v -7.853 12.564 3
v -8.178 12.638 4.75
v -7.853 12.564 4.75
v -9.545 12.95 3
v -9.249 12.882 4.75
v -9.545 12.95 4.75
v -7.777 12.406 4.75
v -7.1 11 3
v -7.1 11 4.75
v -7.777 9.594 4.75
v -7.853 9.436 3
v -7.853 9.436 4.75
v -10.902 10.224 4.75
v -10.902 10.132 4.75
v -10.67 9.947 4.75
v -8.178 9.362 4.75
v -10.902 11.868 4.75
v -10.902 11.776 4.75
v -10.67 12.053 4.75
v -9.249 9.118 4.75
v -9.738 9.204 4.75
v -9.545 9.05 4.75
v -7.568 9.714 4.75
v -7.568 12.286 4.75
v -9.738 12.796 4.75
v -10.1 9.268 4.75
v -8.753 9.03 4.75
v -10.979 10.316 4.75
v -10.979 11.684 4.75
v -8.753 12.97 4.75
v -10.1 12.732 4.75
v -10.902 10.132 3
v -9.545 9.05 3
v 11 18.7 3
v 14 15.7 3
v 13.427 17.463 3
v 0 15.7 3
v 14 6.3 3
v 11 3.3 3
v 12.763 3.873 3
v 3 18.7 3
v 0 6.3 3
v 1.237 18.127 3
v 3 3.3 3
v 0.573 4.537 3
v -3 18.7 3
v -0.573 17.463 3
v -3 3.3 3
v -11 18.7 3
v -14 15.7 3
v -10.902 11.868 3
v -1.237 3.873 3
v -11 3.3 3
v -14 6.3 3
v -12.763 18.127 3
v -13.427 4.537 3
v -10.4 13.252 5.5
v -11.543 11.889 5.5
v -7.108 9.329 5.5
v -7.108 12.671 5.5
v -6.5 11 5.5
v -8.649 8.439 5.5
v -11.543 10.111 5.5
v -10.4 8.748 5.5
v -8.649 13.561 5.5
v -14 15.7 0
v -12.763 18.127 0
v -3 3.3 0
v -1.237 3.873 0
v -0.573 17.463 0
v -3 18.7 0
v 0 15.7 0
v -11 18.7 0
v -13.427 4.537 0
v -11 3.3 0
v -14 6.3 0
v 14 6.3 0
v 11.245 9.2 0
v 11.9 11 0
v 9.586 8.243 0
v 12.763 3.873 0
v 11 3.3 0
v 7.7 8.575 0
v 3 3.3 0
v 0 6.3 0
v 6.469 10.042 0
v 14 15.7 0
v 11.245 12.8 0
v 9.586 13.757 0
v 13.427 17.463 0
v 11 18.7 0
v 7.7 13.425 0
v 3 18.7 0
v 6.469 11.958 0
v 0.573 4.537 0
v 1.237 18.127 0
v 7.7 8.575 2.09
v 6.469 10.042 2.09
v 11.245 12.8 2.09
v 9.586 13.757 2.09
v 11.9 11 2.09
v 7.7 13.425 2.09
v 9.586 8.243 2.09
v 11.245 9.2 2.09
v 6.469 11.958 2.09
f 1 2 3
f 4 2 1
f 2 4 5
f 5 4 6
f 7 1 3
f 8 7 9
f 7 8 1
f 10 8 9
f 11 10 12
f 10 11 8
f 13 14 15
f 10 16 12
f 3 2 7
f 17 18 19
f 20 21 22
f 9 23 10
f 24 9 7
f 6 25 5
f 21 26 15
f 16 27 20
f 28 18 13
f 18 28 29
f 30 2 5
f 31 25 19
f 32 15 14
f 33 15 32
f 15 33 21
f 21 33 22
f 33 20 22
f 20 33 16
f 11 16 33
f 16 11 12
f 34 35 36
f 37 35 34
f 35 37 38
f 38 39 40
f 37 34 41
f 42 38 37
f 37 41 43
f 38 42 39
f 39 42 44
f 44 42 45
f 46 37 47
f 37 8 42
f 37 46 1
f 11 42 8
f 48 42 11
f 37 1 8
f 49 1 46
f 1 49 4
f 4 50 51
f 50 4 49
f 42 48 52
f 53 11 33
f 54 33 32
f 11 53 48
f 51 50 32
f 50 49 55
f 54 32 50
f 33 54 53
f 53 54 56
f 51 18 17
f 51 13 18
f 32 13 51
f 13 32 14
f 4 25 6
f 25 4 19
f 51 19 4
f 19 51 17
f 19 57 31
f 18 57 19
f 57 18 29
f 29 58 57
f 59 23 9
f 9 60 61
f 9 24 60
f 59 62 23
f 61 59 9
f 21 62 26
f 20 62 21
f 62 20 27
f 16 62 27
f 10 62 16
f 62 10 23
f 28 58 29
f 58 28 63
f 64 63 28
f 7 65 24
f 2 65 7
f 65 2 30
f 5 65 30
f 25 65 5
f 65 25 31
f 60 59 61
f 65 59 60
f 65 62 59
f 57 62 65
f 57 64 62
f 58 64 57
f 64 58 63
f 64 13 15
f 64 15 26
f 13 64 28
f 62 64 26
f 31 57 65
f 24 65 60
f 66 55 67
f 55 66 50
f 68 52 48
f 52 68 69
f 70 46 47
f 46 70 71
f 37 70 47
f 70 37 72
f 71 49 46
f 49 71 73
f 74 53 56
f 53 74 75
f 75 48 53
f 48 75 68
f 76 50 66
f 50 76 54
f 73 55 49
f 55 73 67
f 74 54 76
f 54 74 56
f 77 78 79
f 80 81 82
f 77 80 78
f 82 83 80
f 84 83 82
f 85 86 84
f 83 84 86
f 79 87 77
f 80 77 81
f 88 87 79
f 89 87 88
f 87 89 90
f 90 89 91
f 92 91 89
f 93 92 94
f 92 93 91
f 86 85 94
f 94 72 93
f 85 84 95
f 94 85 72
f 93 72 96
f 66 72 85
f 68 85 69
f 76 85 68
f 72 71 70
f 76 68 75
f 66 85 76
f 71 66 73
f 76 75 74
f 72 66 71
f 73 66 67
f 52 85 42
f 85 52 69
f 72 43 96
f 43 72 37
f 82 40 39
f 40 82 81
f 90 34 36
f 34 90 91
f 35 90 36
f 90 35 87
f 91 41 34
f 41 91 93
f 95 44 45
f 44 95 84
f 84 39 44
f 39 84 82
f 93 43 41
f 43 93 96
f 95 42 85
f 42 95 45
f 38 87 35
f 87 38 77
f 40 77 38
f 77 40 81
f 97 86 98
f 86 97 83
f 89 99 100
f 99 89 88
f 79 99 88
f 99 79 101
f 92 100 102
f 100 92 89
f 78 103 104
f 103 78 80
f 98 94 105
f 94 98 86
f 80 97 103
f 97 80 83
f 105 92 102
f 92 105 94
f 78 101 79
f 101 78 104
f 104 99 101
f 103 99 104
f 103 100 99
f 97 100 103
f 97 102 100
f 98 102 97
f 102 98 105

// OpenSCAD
// latches/snap.scad — printed peg-and-socket snap closure.
// MIT licensed.
//
// Convention: end="left" extends in -X from origin; end="right" extends in +X.
// Caller places at x=0 for left and translates to band_length for right.
//
// Both ends have a flat tab extending past the band edge. The LEFT tab has
// a small peg pointing up; the RIGHT tab has a matching socket on its
// underside. When worn, the right tab lays on top of the left tab and the
// peg snaps into the socket.

SNAP_TAB_LENGTH    = 14;   // mm — how far the tab extends past the band
SNAP_PEG_DIAMETER  = 4;    // mm
SNAP_PEG_HEIGHT    = 2.5;  // mm — pegs head sticks above the tab top
SNAP_PEG_HEAD_R    = 2.6;  // mm — flared head, slightly wider than the shaft

module _snap_tab(band_width, band_thickness, direction) {
    // direction = -1 for left (extends -X) or +1 for right (extends +X)
    tab_w = band_width * 0.7;
    x0 = direction == -1 ? -SNAP_TAB_LENGTH : 0;
    translate([x0, (band_width - tab_w) / 2, 0])
        linear_extrude(height = band_thickness)
            offset(r = 3) offset(delta = -3)
                square([SNAP_TAB_LENGTH, tab_w]);
}

module latch_snap(band_width, band_thickness, end = "both") {
    if (end == "left" || end == "both") {
        // tab extends -X
        _snap_tab(band_width, band_thickness, direction = -1);
        // peg pointing up at the tab's tip
        translate([-SNAP_TAB_LENGTH * 0.65, band_width / 2, band_thickness])
            union() {
                cylinder(h = SNAP_PEG_HEIGHT * 0.7, d = SNAP_PEG_DIAMETER);
                translate([0, 0, SNAP_PEG_HEIGHT * 0.7])
                    cylinder(h = SNAP_PEG_HEIGHT * 0.3,
                             r1 = SNAP_PEG_DIAMETER / 2,
                             r2 = SNAP_PEG_HEAD_R);
            }
    }
    if (end == "right" || end == "both") {
        // tab extends +X, with a socket cavity in the underside at the tip
        difference() {
            _snap_tab(band_width, band_thickness, direction = +1);
            // socket: cylindrical cavity sized slightly larger than the peg
            // head, opening downward from z=0 (underside of the tab)
            translate([SNAP_TAB_LENGTH * 0.65, band_width / 2, -0.01])
                cylinder(h = band_thickness * 0.7,
                         d = SNAP_PEG_HEAD_R * 2 + 0.4);
        }
    }
}

latch_snap(22, 3);
